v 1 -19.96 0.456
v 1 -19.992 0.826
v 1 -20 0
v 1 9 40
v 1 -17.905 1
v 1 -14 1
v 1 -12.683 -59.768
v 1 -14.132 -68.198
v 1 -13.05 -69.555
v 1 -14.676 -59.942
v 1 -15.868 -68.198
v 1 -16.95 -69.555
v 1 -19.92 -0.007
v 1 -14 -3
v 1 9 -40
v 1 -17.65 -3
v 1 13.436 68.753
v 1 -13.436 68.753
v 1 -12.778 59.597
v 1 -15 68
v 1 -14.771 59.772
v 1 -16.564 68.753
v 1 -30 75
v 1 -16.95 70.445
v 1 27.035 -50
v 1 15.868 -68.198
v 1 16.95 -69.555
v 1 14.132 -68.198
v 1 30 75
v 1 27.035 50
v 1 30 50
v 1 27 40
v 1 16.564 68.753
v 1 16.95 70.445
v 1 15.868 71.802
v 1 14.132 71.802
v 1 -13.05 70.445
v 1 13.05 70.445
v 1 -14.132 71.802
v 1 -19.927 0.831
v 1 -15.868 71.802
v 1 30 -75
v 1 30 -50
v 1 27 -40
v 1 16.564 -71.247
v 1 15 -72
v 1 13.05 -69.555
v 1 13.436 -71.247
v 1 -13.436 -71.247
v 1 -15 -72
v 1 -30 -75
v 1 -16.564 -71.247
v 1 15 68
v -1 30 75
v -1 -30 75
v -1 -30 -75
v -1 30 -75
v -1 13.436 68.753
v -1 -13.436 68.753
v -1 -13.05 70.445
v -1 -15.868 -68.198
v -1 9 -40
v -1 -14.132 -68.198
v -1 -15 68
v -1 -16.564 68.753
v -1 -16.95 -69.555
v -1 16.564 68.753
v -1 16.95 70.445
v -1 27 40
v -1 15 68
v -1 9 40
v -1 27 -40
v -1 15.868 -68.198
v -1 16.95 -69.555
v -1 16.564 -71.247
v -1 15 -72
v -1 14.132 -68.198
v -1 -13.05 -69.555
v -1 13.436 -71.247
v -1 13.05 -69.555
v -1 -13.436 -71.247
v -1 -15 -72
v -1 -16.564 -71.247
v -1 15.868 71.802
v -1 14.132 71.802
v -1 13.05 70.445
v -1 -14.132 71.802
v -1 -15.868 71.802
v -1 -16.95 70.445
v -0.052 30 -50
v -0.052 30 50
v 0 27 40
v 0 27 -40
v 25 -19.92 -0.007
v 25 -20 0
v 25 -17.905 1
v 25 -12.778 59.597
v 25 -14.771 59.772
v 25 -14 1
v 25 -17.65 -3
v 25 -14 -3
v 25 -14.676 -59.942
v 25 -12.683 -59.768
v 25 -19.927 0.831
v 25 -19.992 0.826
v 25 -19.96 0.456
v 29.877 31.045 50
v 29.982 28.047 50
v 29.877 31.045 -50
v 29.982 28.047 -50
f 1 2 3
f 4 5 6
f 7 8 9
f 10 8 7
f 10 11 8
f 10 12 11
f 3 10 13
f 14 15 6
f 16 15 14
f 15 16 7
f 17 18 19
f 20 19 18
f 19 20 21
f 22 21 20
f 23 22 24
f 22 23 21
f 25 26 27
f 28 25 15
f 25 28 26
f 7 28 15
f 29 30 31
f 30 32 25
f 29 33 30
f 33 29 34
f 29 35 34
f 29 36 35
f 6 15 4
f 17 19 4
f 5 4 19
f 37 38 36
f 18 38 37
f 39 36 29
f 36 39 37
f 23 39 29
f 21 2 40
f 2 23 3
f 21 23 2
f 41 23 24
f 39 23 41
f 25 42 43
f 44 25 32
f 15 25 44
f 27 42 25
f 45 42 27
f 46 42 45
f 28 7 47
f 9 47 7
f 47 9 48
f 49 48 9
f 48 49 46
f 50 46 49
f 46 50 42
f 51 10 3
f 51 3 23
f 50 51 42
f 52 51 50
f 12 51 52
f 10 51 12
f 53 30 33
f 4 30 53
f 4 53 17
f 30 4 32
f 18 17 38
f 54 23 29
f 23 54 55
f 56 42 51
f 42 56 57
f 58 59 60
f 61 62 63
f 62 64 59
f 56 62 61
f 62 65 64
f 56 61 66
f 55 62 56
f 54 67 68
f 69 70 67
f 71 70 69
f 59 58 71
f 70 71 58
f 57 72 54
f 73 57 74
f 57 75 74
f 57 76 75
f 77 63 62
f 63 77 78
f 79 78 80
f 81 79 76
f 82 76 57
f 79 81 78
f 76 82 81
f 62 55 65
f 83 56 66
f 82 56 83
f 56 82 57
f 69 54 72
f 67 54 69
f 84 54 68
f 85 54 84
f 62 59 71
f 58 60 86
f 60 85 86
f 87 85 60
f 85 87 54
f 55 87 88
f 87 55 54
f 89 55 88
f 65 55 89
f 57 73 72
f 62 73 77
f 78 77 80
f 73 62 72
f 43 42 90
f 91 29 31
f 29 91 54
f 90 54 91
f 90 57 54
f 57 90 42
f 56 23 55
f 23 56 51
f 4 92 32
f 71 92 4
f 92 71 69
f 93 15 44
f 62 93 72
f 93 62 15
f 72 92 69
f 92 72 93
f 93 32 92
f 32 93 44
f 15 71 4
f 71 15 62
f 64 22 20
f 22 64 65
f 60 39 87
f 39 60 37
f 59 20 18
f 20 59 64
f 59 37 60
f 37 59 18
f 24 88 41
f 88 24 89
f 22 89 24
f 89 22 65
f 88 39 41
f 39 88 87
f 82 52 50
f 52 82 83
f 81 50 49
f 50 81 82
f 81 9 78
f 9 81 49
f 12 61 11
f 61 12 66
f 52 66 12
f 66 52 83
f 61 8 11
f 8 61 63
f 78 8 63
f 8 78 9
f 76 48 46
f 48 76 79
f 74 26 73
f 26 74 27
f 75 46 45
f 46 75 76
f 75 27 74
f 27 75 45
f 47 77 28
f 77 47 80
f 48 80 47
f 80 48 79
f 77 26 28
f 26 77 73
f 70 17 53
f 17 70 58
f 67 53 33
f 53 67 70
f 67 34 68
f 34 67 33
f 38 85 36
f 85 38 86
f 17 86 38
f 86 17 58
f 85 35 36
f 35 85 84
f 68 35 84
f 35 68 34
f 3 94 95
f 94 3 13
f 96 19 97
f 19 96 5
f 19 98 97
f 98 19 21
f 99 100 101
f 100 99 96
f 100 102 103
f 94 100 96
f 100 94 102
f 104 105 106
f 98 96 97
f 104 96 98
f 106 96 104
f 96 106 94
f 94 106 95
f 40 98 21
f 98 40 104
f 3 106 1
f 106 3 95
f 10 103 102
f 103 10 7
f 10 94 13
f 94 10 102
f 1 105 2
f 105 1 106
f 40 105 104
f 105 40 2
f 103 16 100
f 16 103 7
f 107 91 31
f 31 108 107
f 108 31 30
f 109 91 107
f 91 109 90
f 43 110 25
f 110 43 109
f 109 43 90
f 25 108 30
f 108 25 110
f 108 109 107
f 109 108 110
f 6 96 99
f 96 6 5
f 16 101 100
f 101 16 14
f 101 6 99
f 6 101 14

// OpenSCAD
difference() {
  cube([2, 60, 150], center = true);
  translate([0, 18, 0]) cube([4, 18, 80], center = true);
  translate([0, -15, 70]) rotate([0,90,0]) cylinder(d=4, h=6, center = true);
  translate([0, -15, -70]) rotate([0,90,0]) cylinder(d=4, h=6, center = true);
  translate([0, 15, -70]) rotate([0,90,0]) cylinder(d=4, h=6, center = true);
  translate([0, 15, 70]) rotate([0,90,0]) cylinder(d=4, h=6, center = true);
} 

translate([0, -20, 0]) rotate([-5,0,0]) cube([25, 2, 60]);
translate([0, -18, 1]) rotate([-175,0,0]) cube([25, 2, 61]);
translate([0, 27, -50]) rotate([0,0,2]) cube([30,3,100]);
translate([0, -18, -3]) rotate([0,0,0]) cube([25, 4, 4]);
